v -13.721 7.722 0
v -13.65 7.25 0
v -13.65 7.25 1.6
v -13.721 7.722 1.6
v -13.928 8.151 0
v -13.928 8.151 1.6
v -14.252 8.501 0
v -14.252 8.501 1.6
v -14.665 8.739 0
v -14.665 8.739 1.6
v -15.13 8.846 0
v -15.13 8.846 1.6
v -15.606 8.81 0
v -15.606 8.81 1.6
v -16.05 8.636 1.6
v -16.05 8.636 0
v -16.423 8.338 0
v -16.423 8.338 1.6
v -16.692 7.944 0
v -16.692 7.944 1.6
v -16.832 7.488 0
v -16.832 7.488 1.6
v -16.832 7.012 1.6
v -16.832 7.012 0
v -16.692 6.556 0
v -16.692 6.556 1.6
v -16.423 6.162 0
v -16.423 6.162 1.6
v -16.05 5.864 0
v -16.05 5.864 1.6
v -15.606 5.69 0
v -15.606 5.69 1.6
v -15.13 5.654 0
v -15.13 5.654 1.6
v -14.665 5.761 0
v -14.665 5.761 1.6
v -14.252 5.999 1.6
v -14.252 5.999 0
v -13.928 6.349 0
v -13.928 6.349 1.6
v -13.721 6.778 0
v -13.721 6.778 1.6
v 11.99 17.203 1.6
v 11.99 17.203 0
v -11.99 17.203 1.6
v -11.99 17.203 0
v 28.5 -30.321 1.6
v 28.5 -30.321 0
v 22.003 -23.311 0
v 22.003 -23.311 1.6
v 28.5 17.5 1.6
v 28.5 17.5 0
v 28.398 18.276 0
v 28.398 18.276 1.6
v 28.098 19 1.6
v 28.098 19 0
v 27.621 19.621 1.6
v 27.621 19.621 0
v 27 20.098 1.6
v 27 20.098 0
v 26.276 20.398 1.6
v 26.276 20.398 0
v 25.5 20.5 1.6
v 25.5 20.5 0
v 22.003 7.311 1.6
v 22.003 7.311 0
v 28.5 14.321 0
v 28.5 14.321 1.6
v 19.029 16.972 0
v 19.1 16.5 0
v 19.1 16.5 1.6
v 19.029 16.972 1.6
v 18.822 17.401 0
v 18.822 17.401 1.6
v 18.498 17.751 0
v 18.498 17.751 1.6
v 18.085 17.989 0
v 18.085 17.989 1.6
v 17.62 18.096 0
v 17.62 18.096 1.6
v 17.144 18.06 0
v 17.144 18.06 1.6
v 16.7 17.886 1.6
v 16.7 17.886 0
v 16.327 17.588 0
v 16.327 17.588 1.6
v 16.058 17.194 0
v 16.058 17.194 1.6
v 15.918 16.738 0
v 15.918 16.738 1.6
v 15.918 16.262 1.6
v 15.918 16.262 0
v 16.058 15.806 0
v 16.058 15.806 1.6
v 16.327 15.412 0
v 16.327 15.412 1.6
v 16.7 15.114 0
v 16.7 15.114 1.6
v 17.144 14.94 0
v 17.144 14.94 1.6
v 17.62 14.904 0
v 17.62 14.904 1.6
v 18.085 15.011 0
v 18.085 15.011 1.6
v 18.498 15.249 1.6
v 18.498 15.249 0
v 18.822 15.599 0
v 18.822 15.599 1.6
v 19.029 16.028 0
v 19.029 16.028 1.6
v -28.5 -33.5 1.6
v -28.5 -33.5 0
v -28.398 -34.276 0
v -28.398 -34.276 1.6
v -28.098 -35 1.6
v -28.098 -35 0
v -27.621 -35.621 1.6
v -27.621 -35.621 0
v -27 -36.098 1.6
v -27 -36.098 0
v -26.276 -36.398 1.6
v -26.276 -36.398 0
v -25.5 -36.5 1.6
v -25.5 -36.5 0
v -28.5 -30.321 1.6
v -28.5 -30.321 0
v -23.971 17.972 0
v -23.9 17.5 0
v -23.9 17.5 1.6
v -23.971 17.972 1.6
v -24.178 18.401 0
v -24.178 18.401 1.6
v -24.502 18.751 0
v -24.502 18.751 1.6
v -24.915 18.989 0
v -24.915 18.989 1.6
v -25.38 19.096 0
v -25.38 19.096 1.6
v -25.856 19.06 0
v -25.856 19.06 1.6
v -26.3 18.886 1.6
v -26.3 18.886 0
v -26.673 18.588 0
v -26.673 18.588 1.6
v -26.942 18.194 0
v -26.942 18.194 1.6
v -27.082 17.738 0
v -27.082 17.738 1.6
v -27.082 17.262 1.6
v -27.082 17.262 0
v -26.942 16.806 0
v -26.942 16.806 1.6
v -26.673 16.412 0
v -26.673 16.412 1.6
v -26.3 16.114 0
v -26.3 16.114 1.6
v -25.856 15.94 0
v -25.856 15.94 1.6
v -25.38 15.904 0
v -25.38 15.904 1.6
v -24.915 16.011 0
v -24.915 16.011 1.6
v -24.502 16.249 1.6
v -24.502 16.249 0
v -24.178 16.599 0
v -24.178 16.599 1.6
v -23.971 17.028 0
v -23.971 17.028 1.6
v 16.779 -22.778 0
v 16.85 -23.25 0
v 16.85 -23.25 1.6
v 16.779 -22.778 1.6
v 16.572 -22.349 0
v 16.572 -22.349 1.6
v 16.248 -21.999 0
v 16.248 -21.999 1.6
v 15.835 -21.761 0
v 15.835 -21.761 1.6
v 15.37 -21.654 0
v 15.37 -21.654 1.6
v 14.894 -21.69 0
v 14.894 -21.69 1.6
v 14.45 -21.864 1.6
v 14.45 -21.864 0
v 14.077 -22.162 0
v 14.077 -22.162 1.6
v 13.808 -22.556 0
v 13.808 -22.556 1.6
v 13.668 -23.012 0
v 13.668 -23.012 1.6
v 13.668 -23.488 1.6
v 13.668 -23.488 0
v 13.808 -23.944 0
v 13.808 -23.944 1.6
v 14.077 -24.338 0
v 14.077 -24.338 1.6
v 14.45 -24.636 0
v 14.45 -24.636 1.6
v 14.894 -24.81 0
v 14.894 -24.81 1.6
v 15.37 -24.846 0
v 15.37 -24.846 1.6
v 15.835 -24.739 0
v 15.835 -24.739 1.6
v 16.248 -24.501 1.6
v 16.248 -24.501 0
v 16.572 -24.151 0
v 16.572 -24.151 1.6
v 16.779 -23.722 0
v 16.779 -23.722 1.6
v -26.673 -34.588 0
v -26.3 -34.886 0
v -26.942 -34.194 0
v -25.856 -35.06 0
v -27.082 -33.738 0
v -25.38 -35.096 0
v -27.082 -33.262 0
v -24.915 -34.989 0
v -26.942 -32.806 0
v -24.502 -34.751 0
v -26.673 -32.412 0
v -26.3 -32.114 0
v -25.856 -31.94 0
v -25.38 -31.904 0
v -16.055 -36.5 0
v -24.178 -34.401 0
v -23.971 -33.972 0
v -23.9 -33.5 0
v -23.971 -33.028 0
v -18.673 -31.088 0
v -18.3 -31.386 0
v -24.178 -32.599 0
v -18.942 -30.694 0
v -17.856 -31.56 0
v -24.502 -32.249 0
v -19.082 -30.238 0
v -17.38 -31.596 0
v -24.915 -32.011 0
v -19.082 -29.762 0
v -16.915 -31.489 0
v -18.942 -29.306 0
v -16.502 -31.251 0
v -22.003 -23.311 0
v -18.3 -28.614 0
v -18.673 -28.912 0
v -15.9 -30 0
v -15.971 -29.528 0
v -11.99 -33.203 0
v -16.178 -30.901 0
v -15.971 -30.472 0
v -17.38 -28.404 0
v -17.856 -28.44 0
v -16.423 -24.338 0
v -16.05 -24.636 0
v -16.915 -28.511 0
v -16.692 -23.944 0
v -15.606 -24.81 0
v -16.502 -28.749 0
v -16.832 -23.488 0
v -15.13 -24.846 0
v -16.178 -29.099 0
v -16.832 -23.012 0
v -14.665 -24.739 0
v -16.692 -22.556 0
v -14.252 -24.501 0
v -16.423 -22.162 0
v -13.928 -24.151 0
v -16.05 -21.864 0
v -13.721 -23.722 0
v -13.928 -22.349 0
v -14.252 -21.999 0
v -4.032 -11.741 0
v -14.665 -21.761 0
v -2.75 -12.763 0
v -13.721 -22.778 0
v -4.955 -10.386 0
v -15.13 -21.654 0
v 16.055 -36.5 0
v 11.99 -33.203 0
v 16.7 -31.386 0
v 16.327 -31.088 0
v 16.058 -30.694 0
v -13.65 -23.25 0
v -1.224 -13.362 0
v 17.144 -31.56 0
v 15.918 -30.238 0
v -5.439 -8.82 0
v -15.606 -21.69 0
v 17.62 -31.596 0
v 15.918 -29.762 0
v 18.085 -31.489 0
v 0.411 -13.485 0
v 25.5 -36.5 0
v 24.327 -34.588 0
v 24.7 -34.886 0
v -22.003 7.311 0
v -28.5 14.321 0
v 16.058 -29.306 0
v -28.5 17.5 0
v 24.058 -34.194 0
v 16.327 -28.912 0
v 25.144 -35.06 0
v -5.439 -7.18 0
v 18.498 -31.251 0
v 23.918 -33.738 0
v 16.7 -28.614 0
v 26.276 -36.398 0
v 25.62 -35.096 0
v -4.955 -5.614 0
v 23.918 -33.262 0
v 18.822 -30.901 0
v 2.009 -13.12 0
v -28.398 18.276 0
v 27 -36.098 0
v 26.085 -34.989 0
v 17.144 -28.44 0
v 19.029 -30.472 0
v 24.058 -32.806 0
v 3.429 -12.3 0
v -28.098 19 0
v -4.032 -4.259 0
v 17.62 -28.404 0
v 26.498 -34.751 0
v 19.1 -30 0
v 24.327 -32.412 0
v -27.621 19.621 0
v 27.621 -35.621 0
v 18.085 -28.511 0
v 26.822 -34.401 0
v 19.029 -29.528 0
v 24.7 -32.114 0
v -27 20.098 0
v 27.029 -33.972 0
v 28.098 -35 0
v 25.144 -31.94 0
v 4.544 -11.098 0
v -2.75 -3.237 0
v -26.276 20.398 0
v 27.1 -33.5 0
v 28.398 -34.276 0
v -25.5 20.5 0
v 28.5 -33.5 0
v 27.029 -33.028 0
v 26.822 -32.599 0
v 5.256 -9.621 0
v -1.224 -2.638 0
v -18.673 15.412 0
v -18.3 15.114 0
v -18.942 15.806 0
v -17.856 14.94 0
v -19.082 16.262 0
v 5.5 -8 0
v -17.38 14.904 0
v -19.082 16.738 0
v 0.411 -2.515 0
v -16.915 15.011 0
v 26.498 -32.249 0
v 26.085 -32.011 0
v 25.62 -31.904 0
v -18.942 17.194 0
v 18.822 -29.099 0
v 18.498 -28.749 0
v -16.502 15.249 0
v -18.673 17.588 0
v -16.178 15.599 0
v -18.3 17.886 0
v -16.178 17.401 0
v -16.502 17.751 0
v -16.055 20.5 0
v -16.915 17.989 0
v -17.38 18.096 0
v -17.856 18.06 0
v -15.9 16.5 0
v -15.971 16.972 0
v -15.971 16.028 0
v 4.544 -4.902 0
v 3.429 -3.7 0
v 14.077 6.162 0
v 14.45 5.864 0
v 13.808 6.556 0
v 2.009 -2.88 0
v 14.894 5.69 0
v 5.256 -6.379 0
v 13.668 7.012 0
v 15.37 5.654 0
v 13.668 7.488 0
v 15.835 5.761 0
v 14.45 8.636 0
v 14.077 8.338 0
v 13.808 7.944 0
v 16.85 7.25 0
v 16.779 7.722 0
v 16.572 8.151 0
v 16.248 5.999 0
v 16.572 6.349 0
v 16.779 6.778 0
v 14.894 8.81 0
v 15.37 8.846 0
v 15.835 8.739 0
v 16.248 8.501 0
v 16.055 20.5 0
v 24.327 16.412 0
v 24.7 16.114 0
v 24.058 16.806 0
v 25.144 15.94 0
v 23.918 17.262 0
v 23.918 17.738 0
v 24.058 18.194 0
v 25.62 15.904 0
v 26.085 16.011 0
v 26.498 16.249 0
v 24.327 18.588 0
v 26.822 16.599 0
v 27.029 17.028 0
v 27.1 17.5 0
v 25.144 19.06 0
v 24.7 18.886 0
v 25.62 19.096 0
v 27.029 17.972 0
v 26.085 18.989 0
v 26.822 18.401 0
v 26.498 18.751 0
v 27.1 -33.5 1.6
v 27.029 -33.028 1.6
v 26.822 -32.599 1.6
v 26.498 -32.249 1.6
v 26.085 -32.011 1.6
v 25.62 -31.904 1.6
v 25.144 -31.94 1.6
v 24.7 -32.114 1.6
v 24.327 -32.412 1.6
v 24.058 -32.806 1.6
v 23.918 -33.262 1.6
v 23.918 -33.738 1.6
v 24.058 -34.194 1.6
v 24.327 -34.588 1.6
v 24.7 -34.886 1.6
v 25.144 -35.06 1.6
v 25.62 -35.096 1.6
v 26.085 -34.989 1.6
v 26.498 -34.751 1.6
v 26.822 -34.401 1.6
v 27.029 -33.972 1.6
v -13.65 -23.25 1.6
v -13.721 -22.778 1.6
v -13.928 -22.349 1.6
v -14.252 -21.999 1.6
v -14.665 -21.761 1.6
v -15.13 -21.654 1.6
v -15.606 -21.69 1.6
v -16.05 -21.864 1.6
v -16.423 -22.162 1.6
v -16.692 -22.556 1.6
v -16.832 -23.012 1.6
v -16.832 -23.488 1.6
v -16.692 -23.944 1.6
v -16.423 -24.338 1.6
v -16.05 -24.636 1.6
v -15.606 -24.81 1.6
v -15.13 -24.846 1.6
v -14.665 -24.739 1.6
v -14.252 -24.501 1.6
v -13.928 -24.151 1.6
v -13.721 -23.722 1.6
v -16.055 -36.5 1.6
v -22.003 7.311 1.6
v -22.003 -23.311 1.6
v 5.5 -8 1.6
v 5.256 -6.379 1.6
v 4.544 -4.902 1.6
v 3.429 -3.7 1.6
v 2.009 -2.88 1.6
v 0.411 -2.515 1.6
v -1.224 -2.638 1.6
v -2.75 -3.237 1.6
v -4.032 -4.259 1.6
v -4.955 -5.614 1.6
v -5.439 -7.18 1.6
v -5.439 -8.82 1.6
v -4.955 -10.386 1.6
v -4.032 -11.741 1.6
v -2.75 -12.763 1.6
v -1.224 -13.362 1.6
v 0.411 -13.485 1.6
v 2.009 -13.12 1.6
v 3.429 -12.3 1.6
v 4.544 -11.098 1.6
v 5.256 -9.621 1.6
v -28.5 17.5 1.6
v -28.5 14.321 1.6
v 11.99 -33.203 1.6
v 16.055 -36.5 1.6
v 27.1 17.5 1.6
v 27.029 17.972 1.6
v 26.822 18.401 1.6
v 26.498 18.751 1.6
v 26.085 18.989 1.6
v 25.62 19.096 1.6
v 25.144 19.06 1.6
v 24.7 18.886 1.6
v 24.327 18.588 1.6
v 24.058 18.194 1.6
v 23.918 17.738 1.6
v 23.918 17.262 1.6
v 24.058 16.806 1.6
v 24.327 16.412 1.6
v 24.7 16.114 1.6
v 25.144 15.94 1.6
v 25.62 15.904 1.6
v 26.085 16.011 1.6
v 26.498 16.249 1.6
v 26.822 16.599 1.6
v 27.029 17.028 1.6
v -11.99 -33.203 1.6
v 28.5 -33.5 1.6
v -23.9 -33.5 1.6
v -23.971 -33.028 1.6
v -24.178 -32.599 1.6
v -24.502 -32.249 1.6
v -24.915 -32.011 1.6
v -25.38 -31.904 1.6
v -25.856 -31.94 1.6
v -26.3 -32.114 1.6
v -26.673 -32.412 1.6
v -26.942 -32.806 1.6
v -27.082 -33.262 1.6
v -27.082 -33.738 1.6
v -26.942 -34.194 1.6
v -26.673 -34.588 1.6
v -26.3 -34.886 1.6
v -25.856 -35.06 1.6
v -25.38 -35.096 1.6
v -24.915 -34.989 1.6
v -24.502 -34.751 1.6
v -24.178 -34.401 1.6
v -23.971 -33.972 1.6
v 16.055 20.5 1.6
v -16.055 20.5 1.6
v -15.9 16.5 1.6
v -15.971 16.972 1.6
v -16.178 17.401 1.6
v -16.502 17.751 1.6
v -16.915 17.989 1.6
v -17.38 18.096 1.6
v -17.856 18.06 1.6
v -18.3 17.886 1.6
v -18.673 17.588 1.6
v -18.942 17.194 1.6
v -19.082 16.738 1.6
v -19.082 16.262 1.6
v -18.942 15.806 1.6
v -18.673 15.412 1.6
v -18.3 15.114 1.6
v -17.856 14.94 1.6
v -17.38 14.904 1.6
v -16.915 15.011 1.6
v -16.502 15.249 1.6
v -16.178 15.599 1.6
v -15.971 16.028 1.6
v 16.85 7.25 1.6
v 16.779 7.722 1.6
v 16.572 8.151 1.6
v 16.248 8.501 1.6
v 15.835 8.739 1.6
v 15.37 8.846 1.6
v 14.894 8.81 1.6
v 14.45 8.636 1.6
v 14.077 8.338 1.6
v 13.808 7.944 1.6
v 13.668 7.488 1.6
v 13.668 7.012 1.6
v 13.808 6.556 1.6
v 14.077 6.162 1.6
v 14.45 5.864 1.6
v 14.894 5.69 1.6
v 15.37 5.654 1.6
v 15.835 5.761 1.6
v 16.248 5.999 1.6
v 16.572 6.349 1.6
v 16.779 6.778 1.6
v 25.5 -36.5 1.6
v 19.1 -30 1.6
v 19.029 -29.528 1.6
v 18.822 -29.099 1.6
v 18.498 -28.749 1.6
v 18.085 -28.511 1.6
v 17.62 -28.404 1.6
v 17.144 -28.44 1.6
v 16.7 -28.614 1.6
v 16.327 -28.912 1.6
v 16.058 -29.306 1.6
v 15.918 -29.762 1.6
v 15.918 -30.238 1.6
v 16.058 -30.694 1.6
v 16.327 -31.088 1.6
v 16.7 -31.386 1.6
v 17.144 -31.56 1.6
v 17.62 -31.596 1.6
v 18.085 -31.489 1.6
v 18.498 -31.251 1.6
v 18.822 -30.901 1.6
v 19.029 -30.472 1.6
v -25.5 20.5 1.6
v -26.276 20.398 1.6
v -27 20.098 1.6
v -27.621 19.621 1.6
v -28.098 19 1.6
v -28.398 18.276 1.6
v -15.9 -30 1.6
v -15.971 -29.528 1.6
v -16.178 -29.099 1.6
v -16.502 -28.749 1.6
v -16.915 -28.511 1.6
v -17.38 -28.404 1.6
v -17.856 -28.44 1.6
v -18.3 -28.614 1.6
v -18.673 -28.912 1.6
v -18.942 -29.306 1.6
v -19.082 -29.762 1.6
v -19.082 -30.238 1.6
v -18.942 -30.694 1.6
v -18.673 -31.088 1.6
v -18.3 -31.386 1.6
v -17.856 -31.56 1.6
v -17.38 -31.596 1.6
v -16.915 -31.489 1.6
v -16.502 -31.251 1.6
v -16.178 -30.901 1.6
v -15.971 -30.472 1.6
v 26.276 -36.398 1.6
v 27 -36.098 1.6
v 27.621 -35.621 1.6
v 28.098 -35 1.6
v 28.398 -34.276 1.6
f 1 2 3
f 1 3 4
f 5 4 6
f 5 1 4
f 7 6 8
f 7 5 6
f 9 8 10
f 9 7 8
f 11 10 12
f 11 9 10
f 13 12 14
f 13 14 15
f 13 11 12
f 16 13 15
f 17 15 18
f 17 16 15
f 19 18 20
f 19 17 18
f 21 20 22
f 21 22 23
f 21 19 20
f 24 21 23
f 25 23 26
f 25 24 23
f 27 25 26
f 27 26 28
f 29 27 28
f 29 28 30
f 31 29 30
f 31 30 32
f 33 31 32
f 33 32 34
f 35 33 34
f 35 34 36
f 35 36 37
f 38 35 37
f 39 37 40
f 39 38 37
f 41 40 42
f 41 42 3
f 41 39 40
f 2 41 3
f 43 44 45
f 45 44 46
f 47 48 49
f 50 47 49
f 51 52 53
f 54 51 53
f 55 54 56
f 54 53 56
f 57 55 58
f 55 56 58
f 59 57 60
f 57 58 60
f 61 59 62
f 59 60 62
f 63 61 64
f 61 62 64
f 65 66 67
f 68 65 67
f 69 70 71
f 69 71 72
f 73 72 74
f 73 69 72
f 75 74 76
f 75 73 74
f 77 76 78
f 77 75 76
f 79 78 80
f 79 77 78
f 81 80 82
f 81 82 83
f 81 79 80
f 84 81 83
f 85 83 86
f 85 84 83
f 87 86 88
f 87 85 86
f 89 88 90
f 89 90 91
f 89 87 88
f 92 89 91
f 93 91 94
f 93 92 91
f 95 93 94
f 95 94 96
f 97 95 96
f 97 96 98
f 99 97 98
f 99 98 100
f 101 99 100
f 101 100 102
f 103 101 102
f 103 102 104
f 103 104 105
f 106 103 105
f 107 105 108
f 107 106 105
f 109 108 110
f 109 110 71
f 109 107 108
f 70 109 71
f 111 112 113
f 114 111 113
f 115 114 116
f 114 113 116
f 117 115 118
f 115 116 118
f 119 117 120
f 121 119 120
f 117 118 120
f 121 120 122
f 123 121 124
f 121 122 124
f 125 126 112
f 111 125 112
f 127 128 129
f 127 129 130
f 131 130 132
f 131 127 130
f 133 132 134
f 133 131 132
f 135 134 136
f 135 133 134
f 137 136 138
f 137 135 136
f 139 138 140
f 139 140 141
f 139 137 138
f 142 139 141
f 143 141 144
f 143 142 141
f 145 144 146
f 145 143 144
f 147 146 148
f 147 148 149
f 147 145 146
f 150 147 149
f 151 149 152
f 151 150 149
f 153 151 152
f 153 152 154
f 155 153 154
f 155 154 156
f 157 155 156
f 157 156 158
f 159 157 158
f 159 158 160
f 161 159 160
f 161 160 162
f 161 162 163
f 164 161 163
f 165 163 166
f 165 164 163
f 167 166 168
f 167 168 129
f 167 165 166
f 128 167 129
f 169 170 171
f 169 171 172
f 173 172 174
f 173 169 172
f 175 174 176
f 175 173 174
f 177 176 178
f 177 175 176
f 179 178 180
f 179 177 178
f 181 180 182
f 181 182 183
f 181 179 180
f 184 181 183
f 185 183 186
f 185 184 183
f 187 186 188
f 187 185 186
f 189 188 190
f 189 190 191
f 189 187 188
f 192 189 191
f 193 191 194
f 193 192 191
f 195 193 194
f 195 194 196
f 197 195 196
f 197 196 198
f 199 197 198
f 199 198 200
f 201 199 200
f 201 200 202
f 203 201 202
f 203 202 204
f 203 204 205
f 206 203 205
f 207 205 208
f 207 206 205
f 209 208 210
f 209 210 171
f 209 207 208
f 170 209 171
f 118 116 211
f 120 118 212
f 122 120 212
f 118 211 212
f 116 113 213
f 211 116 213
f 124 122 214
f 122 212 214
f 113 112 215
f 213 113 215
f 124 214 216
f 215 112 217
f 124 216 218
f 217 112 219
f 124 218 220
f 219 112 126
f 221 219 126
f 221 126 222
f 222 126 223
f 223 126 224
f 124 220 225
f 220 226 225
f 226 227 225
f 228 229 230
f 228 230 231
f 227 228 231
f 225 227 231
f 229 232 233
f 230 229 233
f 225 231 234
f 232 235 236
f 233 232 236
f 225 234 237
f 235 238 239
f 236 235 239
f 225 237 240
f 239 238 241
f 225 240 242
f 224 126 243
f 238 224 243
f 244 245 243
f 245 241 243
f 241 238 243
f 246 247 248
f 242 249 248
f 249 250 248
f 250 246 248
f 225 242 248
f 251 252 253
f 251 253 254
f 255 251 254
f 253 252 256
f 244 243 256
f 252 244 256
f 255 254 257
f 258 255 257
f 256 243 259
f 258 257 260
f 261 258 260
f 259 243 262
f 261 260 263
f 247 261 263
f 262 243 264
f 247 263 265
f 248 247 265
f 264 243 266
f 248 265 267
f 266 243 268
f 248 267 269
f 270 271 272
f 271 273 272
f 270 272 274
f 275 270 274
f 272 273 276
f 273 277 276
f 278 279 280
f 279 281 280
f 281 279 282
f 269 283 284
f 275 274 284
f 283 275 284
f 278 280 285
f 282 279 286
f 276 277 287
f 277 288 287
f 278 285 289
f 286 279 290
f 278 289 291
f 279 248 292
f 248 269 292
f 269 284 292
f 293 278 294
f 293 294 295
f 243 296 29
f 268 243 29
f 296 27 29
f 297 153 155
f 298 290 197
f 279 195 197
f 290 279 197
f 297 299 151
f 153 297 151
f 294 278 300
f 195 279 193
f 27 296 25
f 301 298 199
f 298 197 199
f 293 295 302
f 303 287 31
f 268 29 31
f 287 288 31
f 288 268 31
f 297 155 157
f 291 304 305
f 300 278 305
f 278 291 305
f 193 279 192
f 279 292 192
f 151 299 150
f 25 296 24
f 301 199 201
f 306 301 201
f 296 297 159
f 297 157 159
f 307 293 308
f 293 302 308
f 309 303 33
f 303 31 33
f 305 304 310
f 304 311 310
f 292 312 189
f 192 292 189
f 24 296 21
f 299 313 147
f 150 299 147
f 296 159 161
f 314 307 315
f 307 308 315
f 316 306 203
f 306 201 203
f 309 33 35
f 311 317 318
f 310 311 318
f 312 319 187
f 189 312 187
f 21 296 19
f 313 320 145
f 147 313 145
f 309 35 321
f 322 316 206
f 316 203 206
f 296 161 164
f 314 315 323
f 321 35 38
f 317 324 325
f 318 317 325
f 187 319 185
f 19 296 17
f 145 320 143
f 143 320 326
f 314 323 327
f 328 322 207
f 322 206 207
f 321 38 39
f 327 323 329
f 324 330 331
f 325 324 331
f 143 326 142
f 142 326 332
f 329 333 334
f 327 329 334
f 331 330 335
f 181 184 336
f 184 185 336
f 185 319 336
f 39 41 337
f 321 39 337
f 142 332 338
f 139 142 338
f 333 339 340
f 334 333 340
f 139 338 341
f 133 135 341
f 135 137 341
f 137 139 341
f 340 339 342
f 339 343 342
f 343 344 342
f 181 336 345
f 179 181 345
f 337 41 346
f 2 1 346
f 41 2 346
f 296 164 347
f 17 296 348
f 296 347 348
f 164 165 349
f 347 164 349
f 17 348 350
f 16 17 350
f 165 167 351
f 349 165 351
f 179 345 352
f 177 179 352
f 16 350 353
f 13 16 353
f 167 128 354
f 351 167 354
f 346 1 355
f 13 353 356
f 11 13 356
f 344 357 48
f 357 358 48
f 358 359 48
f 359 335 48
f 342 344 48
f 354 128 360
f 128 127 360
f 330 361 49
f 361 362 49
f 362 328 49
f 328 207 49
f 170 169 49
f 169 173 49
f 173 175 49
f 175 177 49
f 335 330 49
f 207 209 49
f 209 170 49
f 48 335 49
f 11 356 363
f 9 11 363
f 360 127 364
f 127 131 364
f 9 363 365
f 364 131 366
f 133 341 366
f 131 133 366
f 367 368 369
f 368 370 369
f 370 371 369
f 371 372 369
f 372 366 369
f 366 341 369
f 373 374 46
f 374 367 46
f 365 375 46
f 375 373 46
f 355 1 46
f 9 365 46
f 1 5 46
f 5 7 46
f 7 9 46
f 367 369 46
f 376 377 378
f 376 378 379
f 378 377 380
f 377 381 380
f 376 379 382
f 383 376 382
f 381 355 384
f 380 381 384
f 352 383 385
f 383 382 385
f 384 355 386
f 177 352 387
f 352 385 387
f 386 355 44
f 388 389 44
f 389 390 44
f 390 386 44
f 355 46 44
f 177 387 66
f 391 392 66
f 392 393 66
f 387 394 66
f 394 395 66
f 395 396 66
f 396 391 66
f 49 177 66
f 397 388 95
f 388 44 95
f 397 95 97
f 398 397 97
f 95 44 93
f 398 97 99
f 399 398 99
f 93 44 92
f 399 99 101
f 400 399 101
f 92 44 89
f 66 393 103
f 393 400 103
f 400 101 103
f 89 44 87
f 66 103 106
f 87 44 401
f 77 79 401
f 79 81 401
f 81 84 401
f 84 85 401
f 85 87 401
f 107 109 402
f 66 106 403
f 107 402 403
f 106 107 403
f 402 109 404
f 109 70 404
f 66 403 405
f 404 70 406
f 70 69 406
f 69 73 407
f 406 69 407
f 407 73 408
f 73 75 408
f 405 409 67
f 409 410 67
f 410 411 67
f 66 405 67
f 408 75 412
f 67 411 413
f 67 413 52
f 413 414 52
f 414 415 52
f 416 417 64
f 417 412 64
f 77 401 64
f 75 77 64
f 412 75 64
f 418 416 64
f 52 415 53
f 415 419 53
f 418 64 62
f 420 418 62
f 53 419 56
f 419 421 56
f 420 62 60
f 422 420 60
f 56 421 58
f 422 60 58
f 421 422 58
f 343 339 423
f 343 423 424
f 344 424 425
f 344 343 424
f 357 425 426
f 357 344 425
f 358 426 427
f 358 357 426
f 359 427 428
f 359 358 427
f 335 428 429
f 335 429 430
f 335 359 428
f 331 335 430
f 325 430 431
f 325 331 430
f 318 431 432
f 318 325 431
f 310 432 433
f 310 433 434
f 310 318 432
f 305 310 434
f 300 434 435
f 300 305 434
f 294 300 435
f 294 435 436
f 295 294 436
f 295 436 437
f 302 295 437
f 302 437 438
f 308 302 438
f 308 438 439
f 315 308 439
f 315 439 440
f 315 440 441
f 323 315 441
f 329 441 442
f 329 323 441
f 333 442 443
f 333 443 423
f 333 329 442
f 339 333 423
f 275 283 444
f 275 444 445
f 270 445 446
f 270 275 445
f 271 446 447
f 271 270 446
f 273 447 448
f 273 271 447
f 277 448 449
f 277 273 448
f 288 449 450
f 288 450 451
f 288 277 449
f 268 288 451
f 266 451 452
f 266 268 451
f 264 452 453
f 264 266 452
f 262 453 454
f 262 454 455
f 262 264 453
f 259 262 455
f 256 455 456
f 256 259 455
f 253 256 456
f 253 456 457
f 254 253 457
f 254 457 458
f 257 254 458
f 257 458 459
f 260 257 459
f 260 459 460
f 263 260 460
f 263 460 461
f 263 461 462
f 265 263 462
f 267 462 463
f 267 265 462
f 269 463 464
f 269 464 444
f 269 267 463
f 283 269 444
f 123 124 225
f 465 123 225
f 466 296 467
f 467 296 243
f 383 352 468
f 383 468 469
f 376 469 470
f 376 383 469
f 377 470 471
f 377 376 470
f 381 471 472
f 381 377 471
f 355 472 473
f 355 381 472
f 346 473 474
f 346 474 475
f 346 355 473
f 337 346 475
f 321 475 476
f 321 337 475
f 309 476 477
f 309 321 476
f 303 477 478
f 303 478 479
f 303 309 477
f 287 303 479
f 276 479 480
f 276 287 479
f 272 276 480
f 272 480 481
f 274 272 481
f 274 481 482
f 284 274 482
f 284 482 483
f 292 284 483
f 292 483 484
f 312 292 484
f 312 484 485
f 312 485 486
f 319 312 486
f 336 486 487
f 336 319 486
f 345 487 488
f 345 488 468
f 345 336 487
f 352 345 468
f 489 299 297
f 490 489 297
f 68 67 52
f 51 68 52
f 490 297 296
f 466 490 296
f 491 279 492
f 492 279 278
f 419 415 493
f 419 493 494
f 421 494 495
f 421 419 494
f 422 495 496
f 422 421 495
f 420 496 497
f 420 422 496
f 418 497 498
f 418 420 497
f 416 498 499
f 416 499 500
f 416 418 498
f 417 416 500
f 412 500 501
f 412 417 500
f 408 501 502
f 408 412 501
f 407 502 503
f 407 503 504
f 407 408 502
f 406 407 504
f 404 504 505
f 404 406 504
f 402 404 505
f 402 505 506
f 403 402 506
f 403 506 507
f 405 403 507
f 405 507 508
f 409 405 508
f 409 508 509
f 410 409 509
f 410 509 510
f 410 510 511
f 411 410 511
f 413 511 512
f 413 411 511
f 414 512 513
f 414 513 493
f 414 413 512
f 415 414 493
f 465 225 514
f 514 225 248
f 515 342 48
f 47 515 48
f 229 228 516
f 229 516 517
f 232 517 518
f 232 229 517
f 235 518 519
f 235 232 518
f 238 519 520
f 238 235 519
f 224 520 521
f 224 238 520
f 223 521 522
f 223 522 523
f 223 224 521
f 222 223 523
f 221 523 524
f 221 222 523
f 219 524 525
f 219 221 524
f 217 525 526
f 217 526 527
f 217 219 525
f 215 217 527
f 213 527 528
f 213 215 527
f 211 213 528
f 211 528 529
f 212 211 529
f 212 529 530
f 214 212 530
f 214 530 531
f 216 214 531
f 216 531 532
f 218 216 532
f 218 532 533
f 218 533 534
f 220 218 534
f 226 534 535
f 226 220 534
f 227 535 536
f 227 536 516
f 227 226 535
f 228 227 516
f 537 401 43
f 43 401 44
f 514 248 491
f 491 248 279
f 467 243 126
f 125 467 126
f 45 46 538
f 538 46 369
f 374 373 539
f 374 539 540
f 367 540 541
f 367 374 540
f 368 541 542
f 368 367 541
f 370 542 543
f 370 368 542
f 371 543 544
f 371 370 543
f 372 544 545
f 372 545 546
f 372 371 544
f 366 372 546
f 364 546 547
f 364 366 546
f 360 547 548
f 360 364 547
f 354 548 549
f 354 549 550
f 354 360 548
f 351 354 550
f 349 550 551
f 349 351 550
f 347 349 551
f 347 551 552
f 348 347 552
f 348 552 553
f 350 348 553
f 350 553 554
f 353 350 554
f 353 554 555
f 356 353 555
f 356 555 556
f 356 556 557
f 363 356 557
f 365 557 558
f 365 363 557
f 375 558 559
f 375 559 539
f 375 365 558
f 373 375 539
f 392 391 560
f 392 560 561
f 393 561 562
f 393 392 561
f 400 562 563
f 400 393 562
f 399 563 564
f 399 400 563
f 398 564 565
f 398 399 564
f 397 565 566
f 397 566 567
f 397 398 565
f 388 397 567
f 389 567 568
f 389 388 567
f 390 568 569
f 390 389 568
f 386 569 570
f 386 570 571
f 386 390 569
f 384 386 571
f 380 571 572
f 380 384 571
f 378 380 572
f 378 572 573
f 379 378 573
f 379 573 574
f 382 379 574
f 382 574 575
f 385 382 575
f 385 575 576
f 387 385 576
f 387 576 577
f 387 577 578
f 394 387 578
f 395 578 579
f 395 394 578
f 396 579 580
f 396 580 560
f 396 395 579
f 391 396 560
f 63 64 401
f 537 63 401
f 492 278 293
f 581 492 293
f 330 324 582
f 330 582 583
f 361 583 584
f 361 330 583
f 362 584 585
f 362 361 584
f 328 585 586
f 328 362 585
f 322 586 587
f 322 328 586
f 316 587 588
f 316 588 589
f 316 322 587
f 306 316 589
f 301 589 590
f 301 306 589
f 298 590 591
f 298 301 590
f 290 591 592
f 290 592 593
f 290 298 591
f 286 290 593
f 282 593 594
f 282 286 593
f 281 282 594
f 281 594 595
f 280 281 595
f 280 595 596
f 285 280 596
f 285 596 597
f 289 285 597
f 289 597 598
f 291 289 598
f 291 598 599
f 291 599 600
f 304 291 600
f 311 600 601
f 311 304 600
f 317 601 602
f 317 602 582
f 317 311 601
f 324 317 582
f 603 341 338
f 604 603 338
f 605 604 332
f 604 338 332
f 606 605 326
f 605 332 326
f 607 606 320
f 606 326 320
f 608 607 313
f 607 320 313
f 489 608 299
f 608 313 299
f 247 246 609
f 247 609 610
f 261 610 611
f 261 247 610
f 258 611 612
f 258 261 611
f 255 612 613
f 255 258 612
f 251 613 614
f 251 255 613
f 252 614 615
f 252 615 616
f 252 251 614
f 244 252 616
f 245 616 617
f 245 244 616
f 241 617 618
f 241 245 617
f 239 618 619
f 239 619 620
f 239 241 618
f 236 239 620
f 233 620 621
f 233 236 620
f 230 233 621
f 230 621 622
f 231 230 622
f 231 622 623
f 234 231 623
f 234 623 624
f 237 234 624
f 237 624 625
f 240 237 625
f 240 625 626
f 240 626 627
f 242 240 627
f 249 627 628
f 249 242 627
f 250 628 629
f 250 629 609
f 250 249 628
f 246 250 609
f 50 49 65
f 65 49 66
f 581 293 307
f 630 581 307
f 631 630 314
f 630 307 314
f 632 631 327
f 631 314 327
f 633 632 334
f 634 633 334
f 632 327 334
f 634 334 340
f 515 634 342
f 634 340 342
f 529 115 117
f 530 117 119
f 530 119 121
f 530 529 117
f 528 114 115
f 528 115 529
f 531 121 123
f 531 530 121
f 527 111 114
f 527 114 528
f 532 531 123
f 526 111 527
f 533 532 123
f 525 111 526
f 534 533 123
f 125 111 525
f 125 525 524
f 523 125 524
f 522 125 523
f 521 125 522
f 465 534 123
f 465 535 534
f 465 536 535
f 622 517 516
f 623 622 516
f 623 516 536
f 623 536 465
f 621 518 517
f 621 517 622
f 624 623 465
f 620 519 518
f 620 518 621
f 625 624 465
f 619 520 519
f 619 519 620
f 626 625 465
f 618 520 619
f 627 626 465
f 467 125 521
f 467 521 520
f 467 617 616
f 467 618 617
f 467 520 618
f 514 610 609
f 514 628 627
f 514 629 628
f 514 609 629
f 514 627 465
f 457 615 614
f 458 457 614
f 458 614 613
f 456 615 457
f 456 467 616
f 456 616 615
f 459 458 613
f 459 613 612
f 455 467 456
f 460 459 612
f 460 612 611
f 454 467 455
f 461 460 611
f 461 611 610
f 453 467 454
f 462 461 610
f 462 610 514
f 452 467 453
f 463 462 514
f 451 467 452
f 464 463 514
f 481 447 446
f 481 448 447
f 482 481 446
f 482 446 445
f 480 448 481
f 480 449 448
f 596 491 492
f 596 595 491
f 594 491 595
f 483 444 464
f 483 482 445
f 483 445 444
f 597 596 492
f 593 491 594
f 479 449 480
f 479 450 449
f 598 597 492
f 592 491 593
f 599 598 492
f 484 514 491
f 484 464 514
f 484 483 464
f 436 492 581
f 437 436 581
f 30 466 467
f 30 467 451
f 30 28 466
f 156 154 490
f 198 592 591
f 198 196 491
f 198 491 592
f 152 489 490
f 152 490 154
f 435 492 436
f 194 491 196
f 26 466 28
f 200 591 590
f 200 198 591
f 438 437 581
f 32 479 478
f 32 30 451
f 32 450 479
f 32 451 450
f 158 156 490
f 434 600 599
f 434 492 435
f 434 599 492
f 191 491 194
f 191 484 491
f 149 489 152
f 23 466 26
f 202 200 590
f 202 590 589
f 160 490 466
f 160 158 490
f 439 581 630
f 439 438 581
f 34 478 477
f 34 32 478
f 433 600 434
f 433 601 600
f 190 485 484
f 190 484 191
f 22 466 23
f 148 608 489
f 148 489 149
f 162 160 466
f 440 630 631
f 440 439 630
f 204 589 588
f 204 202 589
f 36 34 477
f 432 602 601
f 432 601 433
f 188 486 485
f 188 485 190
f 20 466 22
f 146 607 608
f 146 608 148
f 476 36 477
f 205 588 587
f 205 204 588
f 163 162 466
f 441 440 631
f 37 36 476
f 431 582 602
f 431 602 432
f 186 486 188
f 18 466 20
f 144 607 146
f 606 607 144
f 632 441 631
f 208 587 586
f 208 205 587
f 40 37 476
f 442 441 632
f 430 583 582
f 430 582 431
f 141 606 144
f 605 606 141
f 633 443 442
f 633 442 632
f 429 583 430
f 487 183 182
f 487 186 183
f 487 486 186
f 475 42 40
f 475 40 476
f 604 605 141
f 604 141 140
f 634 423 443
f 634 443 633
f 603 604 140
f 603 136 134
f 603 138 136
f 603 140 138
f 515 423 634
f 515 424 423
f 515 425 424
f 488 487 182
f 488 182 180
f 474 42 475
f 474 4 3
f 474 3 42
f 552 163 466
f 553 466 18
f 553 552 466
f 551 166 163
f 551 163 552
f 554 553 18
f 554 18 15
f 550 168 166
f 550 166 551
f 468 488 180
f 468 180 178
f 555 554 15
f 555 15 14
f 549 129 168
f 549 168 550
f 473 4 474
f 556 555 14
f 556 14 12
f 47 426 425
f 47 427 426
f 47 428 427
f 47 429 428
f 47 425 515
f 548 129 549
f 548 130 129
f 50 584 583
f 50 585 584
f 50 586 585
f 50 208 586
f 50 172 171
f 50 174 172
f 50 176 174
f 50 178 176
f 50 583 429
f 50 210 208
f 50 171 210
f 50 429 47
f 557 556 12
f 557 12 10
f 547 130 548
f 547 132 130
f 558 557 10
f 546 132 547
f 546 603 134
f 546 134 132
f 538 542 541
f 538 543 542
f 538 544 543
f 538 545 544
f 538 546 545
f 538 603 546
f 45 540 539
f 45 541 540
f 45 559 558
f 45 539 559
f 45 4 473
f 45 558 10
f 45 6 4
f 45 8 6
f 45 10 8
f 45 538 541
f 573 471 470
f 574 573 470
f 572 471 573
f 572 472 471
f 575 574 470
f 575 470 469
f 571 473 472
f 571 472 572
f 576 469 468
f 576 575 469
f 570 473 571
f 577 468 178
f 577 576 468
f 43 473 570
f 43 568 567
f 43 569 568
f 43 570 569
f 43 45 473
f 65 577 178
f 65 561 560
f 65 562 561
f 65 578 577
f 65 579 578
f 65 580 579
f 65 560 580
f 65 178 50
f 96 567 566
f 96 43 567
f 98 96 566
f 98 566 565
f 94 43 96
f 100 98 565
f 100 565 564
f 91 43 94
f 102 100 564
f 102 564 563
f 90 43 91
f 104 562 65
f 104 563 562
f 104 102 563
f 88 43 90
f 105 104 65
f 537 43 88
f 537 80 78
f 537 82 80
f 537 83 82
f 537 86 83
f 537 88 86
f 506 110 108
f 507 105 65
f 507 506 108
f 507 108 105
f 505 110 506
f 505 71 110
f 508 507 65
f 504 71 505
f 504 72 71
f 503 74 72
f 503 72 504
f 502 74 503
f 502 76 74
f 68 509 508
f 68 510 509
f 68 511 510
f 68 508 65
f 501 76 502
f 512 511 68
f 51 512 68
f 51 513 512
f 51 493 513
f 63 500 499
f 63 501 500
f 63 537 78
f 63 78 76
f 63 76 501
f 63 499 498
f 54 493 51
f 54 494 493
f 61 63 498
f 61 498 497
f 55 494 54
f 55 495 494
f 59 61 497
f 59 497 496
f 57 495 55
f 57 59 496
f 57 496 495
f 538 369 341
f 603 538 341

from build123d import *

# Parameters (mm, degrees)
F0_R     = 1.6
F0_R_2   = 5.5
F1_DEPTH = 1.6


with BuildPart() as f1:
    # F0 (on Top) → F1 (new body)
    with BuildSketch(Plane.XY):
        with BuildLine():
            Line((-16.054926, 20.5), (-25.5, 20.5))
            ThreePointArc((-25.5, 20.5), (-27.62132, 19.62132), (-28.5, 17.5))
            Line((-28.5, 17.5), (-28.5, 14.321139))
            Line((-28.5, 14.321139), (-22.003273, 7.310869))
            Line((-22.003273, 7.310869), (-22.003273, -8))
            Line((-22.003273, -8), (-22.003273, -23.310869))
            Line((-22.003273, -23.310869), (-28.5, -30.321139))
            Line((-28.5, -30.321139), (-28.5, -33.5))
            ThreePointArc((-28.5, -33.5), (-27.62132, -35.62132), (-25.5, -36.5))
            Line((-25.5, -36.5), (-16.054926, -36.5))
            Line((-16.054926, -36.5), (-11.990136, -33.202917))
            Line((-11.990136, -33.202917), (0, -33.202917))
            Line((0, -33.202917), (11.990136, -33.202917))
            Line((11.990136, -33.202917), (16.054926, -36.5))
            Line((16.054926, -36.5), (25.5, -36.5))
            ThreePointArc((25.5, -36.5), (27.62132, -35.62132), (28.5, -33.5))
            Line((28.5, -33.5), (28.5, -30.321139))
            Line((28.5, -30.321139), (22.003273, -23.310869))
            Line((22.003273, -23.310869), (22.003273, -8))
            Line((22.003273, -8), (22.003273, 7.310869))
            Line((22.003273, 7.310869), (28.5, 14.321139))
            Line((28.5, 14.321139), (28.5, 17.5))
            ThreePointArc((28.5, 17.5), (27.62132, 19.62132), (25.5, 20.5))
            Line((25.5, 20.5), (16.054926, 20.5))
            Line((16.054926, 20.5), (11.990136, 17.202917))
            Line((11.990136, 17.202917), (0, 17.202917))
            Line((0, 17.202917), (-11.990136, 17.202917))
            Line((-11.990136, 17.202917), (-16.054926, 20.5))
        make_face()
        with Locations((-25.5, -33.5)):
            Circle(F0_R, mode=Mode.SUBTRACT)
        with Locations((-17.5, -30)):
            Circle(F0_R, mode=Mode.SUBTRACT)
        with Locations((-15.25, -23.25)):
            Circle(F0_R, mode=Mode.SUBTRACT)
        with Locations((17.5, -30)):
            Circle(F0_R, mode=Mode.SUBTRACT)
        with Locations((25.5, -33.5)):
            Circle(F0_R, mode=Mode.SUBTRACT)
        with Locations((15.25, -23.25)):
            Circle(F0_R, mode=Mode.SUBTRACT)
        with Locations((-15.25, 7.25)):
            Circle(F0_R, mode=Mode.SUBTRACT)
        with Locations((-25.5, 17.5)):
            Circle(F0_R, mode=Mode.SUBTRACT)
        with Locations((-17.500001, 16.5)):
            Circle(F0_R, mode=Mode.SUBTRACT)
        with Locations((0, -8)):
            Circle(F0_R_2, mode=Mode.SUBTRACT)
        with Locations((15.25, 7.25)):
            Circle(F0_R, mode=Mode.SUBTRACT)
        with Locations((17.500001, 16.5)):
            Circle(F0_R, mode=Mode.SUBTRACT)
        with Locations((25.5, 17.5)):
            Circle(F0_R, mode=Mode.SUBTRACT)
    extrude(amount=F1_DEPTH)


solid = f1.part
